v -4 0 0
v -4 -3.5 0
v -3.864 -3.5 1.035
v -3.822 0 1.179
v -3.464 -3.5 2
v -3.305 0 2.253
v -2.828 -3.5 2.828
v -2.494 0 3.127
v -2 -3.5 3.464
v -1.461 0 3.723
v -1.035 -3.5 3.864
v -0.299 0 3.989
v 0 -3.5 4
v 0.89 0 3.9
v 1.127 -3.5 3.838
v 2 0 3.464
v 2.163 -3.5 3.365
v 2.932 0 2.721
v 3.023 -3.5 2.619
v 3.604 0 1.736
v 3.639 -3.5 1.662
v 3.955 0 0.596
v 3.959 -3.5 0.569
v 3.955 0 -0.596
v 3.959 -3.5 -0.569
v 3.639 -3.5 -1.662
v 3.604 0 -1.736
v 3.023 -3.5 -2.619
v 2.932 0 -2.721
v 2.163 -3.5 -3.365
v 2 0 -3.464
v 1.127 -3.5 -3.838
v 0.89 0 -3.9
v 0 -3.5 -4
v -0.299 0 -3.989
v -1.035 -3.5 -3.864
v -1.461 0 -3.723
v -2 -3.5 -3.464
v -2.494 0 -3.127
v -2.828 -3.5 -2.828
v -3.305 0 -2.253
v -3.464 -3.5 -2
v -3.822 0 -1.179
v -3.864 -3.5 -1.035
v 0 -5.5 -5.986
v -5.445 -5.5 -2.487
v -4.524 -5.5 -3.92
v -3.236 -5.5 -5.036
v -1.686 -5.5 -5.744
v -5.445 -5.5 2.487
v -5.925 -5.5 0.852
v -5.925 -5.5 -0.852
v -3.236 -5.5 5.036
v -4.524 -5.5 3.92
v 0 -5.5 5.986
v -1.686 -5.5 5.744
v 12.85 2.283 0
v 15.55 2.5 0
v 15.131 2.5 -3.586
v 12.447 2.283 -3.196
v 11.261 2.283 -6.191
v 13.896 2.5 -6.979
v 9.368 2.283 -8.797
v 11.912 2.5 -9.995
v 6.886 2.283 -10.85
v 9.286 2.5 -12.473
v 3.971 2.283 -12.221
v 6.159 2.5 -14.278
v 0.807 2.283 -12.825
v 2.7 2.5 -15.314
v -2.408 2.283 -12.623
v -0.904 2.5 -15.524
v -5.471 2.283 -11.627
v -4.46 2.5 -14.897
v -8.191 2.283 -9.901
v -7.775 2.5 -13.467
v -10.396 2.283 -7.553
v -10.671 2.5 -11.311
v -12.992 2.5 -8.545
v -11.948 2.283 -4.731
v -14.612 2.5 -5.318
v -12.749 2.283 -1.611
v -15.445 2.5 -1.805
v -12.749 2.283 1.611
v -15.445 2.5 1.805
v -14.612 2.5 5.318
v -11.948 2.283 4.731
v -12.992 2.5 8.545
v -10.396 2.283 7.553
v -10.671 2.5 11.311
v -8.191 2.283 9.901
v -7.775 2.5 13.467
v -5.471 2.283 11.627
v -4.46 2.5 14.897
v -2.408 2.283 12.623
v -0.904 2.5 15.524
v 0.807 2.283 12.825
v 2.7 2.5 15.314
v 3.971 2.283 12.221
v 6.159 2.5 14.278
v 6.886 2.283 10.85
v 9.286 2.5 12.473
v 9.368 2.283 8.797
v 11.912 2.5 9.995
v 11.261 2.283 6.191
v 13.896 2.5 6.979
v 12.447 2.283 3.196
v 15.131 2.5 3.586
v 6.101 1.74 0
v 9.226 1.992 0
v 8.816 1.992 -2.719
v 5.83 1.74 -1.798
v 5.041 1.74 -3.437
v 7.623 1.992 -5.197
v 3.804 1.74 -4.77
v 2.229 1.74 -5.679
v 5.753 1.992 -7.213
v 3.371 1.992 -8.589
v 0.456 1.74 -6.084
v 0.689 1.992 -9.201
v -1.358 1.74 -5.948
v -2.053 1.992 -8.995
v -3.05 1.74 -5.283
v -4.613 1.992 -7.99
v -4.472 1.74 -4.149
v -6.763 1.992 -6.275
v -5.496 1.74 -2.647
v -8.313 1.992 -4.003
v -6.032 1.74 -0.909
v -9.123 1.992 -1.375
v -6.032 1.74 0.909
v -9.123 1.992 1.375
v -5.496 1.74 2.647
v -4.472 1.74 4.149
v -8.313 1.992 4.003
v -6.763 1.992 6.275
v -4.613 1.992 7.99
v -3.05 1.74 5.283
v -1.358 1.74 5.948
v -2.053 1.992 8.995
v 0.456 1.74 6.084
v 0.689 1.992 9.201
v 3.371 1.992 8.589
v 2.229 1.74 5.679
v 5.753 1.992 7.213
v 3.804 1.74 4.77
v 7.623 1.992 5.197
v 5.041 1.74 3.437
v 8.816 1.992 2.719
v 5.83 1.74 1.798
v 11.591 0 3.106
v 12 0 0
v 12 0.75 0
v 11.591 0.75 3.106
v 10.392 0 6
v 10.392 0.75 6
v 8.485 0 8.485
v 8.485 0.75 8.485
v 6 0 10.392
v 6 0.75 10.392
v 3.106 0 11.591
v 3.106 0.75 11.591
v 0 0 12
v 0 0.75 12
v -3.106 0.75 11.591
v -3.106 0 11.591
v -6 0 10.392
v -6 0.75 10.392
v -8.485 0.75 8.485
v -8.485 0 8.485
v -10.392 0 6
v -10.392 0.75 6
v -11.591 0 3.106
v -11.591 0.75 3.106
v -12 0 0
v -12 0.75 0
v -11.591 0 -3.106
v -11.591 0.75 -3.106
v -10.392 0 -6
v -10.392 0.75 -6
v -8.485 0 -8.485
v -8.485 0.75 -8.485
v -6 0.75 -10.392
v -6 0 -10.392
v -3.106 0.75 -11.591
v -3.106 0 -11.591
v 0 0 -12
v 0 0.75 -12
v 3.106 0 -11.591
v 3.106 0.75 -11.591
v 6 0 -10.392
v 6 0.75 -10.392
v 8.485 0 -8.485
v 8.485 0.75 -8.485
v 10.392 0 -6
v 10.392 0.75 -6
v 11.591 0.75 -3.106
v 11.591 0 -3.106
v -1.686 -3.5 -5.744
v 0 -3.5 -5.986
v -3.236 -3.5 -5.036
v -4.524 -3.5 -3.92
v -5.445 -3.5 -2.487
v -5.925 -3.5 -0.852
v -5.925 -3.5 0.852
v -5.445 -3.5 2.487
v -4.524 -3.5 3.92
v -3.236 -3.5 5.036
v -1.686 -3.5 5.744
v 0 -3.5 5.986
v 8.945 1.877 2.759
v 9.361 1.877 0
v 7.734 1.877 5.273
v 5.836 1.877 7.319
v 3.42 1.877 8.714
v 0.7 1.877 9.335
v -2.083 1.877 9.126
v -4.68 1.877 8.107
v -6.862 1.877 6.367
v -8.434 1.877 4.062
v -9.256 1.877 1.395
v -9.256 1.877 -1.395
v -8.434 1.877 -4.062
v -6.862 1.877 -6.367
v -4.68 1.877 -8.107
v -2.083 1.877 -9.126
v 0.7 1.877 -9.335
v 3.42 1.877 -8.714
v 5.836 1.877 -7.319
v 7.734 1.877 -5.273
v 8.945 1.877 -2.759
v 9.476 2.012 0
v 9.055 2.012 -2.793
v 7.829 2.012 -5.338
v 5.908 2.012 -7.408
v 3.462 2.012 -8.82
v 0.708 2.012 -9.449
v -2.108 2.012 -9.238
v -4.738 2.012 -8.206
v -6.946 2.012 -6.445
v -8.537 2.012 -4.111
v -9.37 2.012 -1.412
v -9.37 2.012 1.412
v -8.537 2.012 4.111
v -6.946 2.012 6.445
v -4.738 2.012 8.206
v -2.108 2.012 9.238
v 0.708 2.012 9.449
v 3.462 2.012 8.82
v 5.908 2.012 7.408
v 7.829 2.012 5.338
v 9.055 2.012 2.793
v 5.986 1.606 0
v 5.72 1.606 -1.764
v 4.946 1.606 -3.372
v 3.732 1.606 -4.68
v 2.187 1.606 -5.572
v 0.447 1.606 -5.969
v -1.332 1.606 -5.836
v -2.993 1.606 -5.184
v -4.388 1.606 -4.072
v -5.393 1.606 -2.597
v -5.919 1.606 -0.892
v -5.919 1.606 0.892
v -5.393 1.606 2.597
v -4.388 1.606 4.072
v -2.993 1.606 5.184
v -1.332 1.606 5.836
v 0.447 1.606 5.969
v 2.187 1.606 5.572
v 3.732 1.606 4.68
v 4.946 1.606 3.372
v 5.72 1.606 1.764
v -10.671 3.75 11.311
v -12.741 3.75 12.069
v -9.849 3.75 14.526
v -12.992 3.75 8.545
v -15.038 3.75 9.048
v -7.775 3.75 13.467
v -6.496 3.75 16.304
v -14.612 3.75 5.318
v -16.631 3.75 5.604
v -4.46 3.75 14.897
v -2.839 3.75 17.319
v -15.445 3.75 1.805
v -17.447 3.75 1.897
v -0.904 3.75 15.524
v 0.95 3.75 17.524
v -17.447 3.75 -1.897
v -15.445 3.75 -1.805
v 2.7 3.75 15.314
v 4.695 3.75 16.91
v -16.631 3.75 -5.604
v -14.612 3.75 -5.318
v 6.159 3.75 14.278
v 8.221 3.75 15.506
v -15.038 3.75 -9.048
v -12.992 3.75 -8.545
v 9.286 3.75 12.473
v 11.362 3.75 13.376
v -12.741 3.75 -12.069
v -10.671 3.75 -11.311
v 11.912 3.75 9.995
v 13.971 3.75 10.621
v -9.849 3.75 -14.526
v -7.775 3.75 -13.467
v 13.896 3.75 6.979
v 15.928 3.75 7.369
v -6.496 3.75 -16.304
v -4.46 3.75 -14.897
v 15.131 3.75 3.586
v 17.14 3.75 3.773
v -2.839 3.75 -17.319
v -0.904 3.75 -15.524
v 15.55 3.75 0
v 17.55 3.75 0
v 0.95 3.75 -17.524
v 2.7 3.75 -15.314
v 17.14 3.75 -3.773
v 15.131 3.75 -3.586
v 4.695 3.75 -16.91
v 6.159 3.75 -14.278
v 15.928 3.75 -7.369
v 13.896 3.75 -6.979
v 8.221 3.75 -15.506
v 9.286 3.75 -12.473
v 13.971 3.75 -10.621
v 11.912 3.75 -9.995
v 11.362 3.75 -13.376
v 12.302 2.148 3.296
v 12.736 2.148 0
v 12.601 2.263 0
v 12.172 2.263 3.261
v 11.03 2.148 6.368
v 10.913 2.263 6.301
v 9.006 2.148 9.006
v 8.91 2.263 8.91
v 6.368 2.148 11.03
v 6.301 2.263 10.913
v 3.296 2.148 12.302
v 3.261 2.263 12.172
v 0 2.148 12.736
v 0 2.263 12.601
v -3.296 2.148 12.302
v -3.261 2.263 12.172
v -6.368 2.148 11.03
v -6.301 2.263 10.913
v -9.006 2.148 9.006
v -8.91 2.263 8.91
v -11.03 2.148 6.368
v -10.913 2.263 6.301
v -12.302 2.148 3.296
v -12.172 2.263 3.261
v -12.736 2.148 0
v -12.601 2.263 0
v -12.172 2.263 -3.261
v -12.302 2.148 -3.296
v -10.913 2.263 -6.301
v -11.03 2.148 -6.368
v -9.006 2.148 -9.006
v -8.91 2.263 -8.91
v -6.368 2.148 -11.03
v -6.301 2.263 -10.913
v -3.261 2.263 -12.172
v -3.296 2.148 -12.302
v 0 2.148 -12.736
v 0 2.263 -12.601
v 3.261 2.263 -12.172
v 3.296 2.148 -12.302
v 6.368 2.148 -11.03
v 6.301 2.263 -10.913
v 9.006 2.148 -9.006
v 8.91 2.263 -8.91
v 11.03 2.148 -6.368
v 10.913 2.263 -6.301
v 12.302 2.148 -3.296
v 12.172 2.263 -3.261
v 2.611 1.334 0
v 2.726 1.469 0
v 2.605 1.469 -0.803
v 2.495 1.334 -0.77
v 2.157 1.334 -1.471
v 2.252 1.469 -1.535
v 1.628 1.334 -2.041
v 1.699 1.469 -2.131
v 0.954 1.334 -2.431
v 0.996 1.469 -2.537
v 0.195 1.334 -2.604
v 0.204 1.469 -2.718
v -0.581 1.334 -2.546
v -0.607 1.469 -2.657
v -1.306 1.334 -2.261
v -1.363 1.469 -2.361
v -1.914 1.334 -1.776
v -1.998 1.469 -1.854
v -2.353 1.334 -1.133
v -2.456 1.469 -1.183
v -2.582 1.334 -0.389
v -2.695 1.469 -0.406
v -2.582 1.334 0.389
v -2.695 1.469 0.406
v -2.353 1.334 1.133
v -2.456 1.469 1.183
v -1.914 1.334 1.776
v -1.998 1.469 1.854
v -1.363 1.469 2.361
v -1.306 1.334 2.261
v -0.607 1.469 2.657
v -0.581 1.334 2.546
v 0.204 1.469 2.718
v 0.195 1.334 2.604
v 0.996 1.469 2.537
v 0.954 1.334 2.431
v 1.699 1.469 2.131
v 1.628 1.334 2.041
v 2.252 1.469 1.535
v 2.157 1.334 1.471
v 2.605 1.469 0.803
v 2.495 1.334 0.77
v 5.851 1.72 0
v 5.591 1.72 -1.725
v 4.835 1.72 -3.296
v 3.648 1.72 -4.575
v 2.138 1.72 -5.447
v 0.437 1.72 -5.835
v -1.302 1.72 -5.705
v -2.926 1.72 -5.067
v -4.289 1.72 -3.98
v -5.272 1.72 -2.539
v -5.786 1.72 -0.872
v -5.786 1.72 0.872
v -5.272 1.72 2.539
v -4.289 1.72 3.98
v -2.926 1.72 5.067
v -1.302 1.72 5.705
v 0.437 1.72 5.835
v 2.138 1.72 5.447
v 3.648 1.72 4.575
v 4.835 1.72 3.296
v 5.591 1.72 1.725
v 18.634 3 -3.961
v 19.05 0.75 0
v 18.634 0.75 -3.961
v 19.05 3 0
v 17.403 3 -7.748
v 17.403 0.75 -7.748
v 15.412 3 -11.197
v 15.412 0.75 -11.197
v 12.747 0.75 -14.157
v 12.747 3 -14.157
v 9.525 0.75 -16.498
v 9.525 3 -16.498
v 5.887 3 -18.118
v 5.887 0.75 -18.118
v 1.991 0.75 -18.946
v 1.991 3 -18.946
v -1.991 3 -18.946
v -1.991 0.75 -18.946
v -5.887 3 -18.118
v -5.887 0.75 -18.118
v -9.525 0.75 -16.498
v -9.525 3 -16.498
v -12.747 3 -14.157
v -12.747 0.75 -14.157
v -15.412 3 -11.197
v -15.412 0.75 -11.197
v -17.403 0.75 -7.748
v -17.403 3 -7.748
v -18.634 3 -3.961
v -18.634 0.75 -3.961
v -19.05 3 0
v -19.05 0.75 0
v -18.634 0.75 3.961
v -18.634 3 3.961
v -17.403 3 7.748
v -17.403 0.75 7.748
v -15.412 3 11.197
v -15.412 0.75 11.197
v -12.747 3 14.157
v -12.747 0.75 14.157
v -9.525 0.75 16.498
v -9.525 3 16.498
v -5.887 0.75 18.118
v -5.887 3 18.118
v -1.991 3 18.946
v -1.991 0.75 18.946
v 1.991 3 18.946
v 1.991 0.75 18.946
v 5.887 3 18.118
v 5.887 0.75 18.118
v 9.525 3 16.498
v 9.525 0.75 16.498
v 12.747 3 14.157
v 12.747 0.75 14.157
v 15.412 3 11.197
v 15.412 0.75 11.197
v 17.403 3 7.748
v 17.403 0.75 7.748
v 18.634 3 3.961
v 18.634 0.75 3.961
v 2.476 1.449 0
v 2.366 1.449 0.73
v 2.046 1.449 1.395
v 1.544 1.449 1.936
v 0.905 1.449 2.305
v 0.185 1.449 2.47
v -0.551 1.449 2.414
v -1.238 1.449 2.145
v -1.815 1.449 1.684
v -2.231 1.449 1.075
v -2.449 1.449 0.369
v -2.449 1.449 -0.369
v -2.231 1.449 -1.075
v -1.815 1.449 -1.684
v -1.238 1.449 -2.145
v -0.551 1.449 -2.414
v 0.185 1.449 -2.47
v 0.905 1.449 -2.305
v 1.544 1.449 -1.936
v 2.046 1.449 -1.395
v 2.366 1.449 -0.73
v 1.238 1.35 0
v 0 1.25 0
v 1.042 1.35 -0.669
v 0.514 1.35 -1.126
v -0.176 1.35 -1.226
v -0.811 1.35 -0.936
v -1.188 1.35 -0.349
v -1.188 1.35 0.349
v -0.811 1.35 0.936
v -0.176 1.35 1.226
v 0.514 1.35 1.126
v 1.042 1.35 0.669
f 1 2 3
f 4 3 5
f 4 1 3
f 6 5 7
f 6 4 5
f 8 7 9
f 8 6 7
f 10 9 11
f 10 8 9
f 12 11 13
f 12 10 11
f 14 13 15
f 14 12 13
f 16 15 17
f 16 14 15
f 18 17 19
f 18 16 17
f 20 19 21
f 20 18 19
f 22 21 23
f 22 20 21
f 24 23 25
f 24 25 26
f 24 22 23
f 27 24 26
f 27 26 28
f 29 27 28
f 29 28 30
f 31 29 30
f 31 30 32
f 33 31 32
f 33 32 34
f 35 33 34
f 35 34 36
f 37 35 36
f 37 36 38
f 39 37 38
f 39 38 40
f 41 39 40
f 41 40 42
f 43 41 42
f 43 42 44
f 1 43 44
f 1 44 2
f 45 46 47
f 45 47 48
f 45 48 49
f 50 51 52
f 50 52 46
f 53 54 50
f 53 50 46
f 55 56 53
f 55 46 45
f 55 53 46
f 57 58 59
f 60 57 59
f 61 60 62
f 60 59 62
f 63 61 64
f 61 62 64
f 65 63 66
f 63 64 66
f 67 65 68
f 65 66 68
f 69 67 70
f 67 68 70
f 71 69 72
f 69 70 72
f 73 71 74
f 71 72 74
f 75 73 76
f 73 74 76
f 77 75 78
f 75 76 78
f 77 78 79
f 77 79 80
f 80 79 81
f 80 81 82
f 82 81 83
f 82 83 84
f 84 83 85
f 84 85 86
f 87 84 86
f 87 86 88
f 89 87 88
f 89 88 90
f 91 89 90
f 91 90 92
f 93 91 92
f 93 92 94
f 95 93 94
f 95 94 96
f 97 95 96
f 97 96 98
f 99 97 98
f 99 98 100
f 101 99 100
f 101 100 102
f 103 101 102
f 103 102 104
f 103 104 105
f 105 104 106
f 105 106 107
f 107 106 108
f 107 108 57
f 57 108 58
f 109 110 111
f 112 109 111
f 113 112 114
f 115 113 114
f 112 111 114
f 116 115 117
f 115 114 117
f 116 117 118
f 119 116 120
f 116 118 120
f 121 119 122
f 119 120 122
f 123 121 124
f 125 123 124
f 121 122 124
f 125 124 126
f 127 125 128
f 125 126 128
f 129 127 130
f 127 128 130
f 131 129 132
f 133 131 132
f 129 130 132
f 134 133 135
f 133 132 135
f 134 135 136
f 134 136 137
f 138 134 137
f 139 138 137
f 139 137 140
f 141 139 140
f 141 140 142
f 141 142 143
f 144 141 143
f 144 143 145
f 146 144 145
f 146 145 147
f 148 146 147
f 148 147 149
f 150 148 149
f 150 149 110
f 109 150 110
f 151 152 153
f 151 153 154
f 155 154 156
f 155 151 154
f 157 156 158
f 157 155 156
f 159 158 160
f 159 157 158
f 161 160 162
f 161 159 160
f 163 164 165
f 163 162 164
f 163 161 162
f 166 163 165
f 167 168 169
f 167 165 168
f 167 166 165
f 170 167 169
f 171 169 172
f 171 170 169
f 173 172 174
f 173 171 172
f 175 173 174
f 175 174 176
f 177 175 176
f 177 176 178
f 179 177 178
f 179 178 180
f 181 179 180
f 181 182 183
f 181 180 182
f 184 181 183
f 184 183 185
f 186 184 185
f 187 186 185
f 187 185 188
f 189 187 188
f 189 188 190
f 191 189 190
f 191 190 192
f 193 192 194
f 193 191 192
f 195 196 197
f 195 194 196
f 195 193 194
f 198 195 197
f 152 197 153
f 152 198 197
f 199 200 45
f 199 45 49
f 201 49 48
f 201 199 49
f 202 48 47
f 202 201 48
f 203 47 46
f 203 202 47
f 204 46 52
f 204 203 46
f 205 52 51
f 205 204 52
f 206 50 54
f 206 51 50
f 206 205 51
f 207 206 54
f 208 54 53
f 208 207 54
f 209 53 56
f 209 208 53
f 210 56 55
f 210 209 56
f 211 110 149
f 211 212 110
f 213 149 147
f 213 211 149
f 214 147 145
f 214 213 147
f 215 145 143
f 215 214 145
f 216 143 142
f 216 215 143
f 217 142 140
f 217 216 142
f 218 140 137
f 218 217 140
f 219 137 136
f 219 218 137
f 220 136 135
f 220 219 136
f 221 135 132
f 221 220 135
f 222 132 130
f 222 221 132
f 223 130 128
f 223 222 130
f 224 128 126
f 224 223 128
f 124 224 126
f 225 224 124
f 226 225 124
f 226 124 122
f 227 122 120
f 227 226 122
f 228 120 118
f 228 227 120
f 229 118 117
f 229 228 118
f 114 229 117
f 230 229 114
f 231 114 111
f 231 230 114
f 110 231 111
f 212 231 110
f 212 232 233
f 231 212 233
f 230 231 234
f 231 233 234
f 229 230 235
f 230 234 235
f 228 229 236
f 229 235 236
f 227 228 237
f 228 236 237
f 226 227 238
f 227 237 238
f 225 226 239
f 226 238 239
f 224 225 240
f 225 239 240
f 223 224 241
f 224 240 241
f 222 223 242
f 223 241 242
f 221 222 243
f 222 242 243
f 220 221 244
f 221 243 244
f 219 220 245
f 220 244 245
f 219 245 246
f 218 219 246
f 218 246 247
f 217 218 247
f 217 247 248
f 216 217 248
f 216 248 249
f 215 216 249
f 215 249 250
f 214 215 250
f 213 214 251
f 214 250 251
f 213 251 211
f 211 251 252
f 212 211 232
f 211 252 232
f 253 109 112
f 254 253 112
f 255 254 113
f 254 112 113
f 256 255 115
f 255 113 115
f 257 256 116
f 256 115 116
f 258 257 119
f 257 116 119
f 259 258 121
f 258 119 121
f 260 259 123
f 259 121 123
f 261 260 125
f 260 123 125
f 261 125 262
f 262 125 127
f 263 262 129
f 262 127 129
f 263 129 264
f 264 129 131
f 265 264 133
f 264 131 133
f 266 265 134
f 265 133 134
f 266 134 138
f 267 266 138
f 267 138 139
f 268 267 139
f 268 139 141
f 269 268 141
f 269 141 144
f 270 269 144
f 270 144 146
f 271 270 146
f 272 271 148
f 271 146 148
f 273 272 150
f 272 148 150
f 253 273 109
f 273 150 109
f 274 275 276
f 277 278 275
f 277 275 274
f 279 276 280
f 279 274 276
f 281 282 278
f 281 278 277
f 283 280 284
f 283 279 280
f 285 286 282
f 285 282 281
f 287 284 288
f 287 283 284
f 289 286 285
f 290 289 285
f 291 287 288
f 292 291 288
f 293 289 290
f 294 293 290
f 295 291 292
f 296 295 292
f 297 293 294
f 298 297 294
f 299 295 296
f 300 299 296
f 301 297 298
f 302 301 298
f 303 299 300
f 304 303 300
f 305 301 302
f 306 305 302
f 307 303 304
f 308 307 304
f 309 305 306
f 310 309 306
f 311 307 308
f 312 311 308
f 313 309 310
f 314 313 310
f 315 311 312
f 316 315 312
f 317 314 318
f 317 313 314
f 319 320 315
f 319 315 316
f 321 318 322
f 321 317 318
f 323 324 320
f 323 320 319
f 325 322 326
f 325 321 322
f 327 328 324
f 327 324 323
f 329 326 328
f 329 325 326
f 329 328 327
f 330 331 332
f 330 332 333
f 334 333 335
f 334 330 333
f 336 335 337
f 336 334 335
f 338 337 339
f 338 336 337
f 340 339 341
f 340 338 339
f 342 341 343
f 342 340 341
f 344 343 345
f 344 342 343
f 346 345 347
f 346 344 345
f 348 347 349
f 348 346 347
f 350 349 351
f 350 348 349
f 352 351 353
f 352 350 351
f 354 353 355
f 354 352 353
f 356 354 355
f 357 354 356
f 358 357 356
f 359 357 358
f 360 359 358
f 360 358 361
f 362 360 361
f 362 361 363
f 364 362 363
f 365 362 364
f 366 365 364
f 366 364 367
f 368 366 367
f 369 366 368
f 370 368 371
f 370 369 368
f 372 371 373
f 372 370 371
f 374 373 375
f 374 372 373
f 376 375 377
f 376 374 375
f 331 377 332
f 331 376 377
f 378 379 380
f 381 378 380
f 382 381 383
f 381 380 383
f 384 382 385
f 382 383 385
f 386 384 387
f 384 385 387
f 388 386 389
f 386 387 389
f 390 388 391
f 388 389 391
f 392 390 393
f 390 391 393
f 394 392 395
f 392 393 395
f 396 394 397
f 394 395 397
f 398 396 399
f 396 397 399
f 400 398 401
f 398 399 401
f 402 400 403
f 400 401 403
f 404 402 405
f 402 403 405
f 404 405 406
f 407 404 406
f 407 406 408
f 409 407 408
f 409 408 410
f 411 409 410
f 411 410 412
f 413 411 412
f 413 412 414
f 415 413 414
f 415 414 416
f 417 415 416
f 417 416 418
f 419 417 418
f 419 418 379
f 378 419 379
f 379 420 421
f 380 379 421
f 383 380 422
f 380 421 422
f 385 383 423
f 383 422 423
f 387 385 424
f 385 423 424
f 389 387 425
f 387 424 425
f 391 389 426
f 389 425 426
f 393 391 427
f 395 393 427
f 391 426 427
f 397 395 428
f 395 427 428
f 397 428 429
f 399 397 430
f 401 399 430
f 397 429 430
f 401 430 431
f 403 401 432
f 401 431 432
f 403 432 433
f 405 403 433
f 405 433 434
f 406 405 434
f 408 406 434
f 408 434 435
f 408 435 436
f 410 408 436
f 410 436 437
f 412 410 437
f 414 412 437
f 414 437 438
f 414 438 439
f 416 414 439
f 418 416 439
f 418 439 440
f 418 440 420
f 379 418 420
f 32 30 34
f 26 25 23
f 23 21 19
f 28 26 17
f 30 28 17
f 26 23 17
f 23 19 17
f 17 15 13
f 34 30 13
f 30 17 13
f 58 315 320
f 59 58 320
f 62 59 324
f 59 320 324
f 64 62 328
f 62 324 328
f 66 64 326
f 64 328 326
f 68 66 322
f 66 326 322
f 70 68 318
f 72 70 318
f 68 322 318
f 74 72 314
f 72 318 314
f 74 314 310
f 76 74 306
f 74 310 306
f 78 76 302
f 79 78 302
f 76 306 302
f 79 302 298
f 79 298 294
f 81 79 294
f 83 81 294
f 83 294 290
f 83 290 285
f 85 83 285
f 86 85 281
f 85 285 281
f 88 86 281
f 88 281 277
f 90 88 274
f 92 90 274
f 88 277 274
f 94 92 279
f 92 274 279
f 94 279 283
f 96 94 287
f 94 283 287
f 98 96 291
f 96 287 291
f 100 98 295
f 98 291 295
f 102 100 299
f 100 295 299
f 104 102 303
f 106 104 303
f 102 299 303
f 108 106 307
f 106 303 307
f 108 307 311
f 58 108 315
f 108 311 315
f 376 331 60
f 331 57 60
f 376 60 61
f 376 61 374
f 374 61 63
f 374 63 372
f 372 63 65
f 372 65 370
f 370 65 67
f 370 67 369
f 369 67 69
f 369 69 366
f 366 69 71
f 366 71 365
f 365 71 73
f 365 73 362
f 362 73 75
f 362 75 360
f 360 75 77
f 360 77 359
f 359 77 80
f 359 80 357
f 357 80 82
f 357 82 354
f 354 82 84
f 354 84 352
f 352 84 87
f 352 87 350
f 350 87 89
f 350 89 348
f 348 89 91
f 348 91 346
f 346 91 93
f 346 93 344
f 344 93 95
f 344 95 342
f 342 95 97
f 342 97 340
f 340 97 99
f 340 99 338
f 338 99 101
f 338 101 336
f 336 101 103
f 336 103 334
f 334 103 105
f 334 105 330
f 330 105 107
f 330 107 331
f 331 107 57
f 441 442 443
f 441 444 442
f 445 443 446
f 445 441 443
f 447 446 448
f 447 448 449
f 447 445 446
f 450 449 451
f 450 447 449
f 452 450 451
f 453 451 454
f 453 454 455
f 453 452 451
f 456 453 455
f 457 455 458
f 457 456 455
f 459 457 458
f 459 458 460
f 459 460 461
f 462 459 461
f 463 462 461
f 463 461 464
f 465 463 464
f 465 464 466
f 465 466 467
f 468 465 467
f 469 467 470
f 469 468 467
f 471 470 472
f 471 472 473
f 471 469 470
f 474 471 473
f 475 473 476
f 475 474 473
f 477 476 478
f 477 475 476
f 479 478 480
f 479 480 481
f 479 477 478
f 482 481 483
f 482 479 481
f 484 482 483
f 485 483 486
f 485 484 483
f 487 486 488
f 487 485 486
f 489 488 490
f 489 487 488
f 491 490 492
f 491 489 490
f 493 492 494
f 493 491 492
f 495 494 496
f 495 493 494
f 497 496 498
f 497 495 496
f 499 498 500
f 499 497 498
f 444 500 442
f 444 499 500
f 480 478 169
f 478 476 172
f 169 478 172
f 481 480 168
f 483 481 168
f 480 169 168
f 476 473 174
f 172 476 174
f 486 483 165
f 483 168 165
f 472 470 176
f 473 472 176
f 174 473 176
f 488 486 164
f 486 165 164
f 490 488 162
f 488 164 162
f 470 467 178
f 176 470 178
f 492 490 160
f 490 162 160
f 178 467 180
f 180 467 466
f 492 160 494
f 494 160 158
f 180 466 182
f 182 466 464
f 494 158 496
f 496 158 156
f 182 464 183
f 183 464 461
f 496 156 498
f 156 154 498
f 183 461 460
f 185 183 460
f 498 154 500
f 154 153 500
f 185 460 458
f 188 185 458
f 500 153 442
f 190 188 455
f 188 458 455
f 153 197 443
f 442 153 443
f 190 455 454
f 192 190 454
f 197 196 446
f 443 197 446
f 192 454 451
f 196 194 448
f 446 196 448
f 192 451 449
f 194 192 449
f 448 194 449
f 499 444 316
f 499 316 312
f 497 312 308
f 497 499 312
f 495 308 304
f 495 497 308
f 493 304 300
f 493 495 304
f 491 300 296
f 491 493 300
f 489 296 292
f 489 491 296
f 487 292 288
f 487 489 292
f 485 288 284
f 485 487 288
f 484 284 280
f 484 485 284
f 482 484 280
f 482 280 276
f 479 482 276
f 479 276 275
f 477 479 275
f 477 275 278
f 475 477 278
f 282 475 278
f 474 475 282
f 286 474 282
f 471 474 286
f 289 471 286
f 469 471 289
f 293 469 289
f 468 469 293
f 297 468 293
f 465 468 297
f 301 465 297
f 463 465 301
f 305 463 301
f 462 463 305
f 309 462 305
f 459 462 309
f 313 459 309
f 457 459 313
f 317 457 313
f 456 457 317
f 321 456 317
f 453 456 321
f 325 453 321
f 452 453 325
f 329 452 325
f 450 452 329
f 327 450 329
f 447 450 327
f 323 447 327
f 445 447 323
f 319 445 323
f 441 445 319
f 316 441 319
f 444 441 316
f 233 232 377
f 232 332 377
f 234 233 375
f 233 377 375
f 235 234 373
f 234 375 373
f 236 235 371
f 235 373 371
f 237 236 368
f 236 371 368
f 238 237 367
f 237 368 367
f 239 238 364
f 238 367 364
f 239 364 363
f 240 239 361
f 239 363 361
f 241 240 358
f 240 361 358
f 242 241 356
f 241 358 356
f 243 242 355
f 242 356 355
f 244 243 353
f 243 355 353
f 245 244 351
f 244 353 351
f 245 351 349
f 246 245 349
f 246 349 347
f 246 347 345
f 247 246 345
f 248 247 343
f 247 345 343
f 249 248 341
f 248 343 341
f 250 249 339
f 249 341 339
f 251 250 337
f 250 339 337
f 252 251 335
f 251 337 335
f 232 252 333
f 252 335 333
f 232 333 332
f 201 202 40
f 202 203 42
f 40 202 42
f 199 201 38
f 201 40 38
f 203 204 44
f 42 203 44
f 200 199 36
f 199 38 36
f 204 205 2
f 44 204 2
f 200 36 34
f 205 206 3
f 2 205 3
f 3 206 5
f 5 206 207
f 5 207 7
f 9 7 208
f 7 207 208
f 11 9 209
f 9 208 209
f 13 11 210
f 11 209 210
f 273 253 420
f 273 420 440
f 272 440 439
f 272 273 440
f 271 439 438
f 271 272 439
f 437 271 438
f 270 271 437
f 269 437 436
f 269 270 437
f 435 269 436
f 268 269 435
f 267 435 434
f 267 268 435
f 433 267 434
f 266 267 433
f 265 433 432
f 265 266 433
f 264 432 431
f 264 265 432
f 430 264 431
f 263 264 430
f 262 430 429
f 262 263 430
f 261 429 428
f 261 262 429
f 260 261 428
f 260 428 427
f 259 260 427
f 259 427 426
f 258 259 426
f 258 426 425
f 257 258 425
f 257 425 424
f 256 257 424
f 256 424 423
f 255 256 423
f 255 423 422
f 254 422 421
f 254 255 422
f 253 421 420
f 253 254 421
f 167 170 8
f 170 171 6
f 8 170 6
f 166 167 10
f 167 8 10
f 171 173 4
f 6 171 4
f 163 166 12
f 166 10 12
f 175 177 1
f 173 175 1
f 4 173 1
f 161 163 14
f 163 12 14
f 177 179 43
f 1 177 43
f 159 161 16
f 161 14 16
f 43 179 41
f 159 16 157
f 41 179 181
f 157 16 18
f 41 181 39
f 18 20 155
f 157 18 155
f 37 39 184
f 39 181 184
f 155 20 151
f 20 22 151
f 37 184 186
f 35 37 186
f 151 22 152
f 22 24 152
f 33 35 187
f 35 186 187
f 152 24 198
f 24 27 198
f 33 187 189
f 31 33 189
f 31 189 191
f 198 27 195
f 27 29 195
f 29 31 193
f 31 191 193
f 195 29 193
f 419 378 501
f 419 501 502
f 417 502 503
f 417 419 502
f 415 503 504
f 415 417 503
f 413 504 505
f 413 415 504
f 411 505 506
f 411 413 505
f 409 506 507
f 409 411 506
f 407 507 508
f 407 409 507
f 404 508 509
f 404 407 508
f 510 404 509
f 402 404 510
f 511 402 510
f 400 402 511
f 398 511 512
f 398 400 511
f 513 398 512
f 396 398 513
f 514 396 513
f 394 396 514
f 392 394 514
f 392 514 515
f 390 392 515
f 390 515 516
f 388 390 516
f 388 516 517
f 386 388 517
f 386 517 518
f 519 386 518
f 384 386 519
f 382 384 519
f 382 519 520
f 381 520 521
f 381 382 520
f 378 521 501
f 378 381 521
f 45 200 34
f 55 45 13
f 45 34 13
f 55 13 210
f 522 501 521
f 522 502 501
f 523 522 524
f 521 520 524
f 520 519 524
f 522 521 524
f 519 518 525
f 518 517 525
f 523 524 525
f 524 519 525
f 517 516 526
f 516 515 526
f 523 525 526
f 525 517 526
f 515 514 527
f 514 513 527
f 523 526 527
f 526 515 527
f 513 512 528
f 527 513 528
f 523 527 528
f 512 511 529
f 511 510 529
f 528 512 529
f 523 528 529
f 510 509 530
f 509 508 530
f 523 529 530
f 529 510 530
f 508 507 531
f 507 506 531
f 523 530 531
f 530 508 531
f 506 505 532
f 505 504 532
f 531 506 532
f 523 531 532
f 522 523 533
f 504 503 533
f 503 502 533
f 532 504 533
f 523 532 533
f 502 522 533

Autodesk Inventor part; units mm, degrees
ref_plane "YZ Plane" through (0, 0, 0) normal (1, 0, 0) x (0, 1, 0)
ref_plane "XZ Plane" through (0, 0, 0) normal (0, 1, 0) x (-1, 0, 0)
ref_plane "XY Plane" through (0, 0, 0) normal (0, 0, 1) x (1, 0, 0)
sketch "Sketch1" plane through (0, 0, 0) normal (0, 1, 0) x (-1, 0, 0)
  circle A0 centre (0, 0) radius 4
  line L0 (0, 0) -> (4, 0) construction
  line L1 (0, 0) -> (0, -4) construction
  line L2 (0, 0) -> (-4, 0) construction
  line L3 (0, 0) -> (0, 4) construction
  dimension "d0" = 8
extrude "Extrusion1" add sketch "Sketch1" against normal blind 3.5
ref_plane "Work Plane1" through (0, 0, 0) normal (0, 0, 1) x (1, 0, 0)
sketch "Sketch2" plane through (0, 0, 0) normal (0, 0, 1) x (1, 0, 0)
  line L0 (-4, 0) -> (4, 0) projected
  line L1 (4, 0) -> (12, 0)
  line L2 (19.05, 0.75) -> (19.05, 3)
  line L3 (17.55, 3.75) -> (15.55, 3.75)
  line L4 (0, 0) -> (0, 1.25)
  line L5 (4, 0) -> (4, 1.5959) construction
  line L6 (19.05, 0.75) -> (12, 0.75)
  line L7 (12, 0.75) -> (12, 0)
  line L8 (19.05, 3) -> (17.55, 3.75)
  line L9 (15.55, 2.5) -> (15.55, 3.75)
  line L10 (9.2263, 1.9917) -> (9.3609, 1.8771)
  line L11 (9.3609, 1.8771) -> (9.4755, 2.0117)
  line L12 (6.1006, 1.7404) -> (5.986, 1.6058)
  line L13 (5.986, 1.6058) -> (5.8514, 1.7204)
  line L14 (2.4765, 1.4491) -> (2.6111, 1.3345)
  line L15 (2.6111, 1.3345) -> (2.7257, 1.4691)
  line L16 (0, 1.25) -> (2.4765, 1.4491)
  line L17 (2.7257, 1.4691) -> (5.8514, 1.7204)
  line L18 (6.1006, 1.7404) -> (9.2263, 1.9917)
  line L19 (5.986, 1.6058) -> (5.986, 3.125) construction
  line L20 (9.3609, 1.8771) -> (9.3609, 3.125) construction
  line L21 (9.3609, 3.125) -> (5.986, 3.125) construction
  line L22 (5.986, 3.125) -> (2.6111, 3.125) construction
  line L23 (2.6111, 3.125) -> (0, 3.125) construction
  line L24 (2.4765, 1.4491) -> (2.7257, 1.4691) construction
  line L25 (5.8514, 1.7204) -> (6.1006, 1.7404) construction
  line L26 (9.2263, 1.9917) -> (9.4755, 2.0117) construction
  line L27 (2.6011, 1.4591) -> (2.6111, 1.3345) construction
  line L28 (5.986, 1.7312) -> (5.986, 1.6058) construction
  line L29 (2.6111, 1.3345) -> (2.6111, 3.125) construction
  line L30 (12.6012, 2.263) -> (12.7358, 2.1484)
  line L31 (12.7358, 2.1484) -> (12.8504, 2.283)
  line L32 (12.7358, 2.1484) -> (12.7358, 3.125) construction
  line L33 (9.4755, 2.0117) -> (12.6012, 2.263)
  line L34 (12.8504, 2.283) -> (15.55, 2.5)
  line L35 (9.3609, 3.125) -> (12.7358, 3.125) construction
  line L36 (12.7358, 3.125) -> (15.55, 3.125) construction
  point P0 (9.3609, 2.0025)
  dimension "d11" = 12
  dimension "d12" = 0.75
  dimension "d13" = 3
  dimension "d14" = 0.75
  dimension "d15" = 1.5
  dimension "d16" = 1.25
  dimension "d19" = 3.5
  dimension "d23" = 1.25
  dimension "d25" = 0.125
  dimension "d30" = 19.05
revolve "Revolution1" add sketch "Sketch2" angle 360 about axis through (0, 0, 0) along (0, 1, 0)
sketch "Sketch3" plane through (0, -3.5, 0) normal (0, -1, 0) x (1, 0, 0)
  circle A0 centre (0, 0) radius 5.986 projected
  arc A1 (0, 5.986) -> (0, -5.986) centre (0, 0) ccw
  line L0 (0, -5.986) -> (0, 5.986)
extrude "Extrusion2" add sketch "Sketch3" along normal blind 2 contours L0 A0 picked at (-2.1196, -1.0755)
properties part number "Caps 8mm Square Rounded Caps Male"
